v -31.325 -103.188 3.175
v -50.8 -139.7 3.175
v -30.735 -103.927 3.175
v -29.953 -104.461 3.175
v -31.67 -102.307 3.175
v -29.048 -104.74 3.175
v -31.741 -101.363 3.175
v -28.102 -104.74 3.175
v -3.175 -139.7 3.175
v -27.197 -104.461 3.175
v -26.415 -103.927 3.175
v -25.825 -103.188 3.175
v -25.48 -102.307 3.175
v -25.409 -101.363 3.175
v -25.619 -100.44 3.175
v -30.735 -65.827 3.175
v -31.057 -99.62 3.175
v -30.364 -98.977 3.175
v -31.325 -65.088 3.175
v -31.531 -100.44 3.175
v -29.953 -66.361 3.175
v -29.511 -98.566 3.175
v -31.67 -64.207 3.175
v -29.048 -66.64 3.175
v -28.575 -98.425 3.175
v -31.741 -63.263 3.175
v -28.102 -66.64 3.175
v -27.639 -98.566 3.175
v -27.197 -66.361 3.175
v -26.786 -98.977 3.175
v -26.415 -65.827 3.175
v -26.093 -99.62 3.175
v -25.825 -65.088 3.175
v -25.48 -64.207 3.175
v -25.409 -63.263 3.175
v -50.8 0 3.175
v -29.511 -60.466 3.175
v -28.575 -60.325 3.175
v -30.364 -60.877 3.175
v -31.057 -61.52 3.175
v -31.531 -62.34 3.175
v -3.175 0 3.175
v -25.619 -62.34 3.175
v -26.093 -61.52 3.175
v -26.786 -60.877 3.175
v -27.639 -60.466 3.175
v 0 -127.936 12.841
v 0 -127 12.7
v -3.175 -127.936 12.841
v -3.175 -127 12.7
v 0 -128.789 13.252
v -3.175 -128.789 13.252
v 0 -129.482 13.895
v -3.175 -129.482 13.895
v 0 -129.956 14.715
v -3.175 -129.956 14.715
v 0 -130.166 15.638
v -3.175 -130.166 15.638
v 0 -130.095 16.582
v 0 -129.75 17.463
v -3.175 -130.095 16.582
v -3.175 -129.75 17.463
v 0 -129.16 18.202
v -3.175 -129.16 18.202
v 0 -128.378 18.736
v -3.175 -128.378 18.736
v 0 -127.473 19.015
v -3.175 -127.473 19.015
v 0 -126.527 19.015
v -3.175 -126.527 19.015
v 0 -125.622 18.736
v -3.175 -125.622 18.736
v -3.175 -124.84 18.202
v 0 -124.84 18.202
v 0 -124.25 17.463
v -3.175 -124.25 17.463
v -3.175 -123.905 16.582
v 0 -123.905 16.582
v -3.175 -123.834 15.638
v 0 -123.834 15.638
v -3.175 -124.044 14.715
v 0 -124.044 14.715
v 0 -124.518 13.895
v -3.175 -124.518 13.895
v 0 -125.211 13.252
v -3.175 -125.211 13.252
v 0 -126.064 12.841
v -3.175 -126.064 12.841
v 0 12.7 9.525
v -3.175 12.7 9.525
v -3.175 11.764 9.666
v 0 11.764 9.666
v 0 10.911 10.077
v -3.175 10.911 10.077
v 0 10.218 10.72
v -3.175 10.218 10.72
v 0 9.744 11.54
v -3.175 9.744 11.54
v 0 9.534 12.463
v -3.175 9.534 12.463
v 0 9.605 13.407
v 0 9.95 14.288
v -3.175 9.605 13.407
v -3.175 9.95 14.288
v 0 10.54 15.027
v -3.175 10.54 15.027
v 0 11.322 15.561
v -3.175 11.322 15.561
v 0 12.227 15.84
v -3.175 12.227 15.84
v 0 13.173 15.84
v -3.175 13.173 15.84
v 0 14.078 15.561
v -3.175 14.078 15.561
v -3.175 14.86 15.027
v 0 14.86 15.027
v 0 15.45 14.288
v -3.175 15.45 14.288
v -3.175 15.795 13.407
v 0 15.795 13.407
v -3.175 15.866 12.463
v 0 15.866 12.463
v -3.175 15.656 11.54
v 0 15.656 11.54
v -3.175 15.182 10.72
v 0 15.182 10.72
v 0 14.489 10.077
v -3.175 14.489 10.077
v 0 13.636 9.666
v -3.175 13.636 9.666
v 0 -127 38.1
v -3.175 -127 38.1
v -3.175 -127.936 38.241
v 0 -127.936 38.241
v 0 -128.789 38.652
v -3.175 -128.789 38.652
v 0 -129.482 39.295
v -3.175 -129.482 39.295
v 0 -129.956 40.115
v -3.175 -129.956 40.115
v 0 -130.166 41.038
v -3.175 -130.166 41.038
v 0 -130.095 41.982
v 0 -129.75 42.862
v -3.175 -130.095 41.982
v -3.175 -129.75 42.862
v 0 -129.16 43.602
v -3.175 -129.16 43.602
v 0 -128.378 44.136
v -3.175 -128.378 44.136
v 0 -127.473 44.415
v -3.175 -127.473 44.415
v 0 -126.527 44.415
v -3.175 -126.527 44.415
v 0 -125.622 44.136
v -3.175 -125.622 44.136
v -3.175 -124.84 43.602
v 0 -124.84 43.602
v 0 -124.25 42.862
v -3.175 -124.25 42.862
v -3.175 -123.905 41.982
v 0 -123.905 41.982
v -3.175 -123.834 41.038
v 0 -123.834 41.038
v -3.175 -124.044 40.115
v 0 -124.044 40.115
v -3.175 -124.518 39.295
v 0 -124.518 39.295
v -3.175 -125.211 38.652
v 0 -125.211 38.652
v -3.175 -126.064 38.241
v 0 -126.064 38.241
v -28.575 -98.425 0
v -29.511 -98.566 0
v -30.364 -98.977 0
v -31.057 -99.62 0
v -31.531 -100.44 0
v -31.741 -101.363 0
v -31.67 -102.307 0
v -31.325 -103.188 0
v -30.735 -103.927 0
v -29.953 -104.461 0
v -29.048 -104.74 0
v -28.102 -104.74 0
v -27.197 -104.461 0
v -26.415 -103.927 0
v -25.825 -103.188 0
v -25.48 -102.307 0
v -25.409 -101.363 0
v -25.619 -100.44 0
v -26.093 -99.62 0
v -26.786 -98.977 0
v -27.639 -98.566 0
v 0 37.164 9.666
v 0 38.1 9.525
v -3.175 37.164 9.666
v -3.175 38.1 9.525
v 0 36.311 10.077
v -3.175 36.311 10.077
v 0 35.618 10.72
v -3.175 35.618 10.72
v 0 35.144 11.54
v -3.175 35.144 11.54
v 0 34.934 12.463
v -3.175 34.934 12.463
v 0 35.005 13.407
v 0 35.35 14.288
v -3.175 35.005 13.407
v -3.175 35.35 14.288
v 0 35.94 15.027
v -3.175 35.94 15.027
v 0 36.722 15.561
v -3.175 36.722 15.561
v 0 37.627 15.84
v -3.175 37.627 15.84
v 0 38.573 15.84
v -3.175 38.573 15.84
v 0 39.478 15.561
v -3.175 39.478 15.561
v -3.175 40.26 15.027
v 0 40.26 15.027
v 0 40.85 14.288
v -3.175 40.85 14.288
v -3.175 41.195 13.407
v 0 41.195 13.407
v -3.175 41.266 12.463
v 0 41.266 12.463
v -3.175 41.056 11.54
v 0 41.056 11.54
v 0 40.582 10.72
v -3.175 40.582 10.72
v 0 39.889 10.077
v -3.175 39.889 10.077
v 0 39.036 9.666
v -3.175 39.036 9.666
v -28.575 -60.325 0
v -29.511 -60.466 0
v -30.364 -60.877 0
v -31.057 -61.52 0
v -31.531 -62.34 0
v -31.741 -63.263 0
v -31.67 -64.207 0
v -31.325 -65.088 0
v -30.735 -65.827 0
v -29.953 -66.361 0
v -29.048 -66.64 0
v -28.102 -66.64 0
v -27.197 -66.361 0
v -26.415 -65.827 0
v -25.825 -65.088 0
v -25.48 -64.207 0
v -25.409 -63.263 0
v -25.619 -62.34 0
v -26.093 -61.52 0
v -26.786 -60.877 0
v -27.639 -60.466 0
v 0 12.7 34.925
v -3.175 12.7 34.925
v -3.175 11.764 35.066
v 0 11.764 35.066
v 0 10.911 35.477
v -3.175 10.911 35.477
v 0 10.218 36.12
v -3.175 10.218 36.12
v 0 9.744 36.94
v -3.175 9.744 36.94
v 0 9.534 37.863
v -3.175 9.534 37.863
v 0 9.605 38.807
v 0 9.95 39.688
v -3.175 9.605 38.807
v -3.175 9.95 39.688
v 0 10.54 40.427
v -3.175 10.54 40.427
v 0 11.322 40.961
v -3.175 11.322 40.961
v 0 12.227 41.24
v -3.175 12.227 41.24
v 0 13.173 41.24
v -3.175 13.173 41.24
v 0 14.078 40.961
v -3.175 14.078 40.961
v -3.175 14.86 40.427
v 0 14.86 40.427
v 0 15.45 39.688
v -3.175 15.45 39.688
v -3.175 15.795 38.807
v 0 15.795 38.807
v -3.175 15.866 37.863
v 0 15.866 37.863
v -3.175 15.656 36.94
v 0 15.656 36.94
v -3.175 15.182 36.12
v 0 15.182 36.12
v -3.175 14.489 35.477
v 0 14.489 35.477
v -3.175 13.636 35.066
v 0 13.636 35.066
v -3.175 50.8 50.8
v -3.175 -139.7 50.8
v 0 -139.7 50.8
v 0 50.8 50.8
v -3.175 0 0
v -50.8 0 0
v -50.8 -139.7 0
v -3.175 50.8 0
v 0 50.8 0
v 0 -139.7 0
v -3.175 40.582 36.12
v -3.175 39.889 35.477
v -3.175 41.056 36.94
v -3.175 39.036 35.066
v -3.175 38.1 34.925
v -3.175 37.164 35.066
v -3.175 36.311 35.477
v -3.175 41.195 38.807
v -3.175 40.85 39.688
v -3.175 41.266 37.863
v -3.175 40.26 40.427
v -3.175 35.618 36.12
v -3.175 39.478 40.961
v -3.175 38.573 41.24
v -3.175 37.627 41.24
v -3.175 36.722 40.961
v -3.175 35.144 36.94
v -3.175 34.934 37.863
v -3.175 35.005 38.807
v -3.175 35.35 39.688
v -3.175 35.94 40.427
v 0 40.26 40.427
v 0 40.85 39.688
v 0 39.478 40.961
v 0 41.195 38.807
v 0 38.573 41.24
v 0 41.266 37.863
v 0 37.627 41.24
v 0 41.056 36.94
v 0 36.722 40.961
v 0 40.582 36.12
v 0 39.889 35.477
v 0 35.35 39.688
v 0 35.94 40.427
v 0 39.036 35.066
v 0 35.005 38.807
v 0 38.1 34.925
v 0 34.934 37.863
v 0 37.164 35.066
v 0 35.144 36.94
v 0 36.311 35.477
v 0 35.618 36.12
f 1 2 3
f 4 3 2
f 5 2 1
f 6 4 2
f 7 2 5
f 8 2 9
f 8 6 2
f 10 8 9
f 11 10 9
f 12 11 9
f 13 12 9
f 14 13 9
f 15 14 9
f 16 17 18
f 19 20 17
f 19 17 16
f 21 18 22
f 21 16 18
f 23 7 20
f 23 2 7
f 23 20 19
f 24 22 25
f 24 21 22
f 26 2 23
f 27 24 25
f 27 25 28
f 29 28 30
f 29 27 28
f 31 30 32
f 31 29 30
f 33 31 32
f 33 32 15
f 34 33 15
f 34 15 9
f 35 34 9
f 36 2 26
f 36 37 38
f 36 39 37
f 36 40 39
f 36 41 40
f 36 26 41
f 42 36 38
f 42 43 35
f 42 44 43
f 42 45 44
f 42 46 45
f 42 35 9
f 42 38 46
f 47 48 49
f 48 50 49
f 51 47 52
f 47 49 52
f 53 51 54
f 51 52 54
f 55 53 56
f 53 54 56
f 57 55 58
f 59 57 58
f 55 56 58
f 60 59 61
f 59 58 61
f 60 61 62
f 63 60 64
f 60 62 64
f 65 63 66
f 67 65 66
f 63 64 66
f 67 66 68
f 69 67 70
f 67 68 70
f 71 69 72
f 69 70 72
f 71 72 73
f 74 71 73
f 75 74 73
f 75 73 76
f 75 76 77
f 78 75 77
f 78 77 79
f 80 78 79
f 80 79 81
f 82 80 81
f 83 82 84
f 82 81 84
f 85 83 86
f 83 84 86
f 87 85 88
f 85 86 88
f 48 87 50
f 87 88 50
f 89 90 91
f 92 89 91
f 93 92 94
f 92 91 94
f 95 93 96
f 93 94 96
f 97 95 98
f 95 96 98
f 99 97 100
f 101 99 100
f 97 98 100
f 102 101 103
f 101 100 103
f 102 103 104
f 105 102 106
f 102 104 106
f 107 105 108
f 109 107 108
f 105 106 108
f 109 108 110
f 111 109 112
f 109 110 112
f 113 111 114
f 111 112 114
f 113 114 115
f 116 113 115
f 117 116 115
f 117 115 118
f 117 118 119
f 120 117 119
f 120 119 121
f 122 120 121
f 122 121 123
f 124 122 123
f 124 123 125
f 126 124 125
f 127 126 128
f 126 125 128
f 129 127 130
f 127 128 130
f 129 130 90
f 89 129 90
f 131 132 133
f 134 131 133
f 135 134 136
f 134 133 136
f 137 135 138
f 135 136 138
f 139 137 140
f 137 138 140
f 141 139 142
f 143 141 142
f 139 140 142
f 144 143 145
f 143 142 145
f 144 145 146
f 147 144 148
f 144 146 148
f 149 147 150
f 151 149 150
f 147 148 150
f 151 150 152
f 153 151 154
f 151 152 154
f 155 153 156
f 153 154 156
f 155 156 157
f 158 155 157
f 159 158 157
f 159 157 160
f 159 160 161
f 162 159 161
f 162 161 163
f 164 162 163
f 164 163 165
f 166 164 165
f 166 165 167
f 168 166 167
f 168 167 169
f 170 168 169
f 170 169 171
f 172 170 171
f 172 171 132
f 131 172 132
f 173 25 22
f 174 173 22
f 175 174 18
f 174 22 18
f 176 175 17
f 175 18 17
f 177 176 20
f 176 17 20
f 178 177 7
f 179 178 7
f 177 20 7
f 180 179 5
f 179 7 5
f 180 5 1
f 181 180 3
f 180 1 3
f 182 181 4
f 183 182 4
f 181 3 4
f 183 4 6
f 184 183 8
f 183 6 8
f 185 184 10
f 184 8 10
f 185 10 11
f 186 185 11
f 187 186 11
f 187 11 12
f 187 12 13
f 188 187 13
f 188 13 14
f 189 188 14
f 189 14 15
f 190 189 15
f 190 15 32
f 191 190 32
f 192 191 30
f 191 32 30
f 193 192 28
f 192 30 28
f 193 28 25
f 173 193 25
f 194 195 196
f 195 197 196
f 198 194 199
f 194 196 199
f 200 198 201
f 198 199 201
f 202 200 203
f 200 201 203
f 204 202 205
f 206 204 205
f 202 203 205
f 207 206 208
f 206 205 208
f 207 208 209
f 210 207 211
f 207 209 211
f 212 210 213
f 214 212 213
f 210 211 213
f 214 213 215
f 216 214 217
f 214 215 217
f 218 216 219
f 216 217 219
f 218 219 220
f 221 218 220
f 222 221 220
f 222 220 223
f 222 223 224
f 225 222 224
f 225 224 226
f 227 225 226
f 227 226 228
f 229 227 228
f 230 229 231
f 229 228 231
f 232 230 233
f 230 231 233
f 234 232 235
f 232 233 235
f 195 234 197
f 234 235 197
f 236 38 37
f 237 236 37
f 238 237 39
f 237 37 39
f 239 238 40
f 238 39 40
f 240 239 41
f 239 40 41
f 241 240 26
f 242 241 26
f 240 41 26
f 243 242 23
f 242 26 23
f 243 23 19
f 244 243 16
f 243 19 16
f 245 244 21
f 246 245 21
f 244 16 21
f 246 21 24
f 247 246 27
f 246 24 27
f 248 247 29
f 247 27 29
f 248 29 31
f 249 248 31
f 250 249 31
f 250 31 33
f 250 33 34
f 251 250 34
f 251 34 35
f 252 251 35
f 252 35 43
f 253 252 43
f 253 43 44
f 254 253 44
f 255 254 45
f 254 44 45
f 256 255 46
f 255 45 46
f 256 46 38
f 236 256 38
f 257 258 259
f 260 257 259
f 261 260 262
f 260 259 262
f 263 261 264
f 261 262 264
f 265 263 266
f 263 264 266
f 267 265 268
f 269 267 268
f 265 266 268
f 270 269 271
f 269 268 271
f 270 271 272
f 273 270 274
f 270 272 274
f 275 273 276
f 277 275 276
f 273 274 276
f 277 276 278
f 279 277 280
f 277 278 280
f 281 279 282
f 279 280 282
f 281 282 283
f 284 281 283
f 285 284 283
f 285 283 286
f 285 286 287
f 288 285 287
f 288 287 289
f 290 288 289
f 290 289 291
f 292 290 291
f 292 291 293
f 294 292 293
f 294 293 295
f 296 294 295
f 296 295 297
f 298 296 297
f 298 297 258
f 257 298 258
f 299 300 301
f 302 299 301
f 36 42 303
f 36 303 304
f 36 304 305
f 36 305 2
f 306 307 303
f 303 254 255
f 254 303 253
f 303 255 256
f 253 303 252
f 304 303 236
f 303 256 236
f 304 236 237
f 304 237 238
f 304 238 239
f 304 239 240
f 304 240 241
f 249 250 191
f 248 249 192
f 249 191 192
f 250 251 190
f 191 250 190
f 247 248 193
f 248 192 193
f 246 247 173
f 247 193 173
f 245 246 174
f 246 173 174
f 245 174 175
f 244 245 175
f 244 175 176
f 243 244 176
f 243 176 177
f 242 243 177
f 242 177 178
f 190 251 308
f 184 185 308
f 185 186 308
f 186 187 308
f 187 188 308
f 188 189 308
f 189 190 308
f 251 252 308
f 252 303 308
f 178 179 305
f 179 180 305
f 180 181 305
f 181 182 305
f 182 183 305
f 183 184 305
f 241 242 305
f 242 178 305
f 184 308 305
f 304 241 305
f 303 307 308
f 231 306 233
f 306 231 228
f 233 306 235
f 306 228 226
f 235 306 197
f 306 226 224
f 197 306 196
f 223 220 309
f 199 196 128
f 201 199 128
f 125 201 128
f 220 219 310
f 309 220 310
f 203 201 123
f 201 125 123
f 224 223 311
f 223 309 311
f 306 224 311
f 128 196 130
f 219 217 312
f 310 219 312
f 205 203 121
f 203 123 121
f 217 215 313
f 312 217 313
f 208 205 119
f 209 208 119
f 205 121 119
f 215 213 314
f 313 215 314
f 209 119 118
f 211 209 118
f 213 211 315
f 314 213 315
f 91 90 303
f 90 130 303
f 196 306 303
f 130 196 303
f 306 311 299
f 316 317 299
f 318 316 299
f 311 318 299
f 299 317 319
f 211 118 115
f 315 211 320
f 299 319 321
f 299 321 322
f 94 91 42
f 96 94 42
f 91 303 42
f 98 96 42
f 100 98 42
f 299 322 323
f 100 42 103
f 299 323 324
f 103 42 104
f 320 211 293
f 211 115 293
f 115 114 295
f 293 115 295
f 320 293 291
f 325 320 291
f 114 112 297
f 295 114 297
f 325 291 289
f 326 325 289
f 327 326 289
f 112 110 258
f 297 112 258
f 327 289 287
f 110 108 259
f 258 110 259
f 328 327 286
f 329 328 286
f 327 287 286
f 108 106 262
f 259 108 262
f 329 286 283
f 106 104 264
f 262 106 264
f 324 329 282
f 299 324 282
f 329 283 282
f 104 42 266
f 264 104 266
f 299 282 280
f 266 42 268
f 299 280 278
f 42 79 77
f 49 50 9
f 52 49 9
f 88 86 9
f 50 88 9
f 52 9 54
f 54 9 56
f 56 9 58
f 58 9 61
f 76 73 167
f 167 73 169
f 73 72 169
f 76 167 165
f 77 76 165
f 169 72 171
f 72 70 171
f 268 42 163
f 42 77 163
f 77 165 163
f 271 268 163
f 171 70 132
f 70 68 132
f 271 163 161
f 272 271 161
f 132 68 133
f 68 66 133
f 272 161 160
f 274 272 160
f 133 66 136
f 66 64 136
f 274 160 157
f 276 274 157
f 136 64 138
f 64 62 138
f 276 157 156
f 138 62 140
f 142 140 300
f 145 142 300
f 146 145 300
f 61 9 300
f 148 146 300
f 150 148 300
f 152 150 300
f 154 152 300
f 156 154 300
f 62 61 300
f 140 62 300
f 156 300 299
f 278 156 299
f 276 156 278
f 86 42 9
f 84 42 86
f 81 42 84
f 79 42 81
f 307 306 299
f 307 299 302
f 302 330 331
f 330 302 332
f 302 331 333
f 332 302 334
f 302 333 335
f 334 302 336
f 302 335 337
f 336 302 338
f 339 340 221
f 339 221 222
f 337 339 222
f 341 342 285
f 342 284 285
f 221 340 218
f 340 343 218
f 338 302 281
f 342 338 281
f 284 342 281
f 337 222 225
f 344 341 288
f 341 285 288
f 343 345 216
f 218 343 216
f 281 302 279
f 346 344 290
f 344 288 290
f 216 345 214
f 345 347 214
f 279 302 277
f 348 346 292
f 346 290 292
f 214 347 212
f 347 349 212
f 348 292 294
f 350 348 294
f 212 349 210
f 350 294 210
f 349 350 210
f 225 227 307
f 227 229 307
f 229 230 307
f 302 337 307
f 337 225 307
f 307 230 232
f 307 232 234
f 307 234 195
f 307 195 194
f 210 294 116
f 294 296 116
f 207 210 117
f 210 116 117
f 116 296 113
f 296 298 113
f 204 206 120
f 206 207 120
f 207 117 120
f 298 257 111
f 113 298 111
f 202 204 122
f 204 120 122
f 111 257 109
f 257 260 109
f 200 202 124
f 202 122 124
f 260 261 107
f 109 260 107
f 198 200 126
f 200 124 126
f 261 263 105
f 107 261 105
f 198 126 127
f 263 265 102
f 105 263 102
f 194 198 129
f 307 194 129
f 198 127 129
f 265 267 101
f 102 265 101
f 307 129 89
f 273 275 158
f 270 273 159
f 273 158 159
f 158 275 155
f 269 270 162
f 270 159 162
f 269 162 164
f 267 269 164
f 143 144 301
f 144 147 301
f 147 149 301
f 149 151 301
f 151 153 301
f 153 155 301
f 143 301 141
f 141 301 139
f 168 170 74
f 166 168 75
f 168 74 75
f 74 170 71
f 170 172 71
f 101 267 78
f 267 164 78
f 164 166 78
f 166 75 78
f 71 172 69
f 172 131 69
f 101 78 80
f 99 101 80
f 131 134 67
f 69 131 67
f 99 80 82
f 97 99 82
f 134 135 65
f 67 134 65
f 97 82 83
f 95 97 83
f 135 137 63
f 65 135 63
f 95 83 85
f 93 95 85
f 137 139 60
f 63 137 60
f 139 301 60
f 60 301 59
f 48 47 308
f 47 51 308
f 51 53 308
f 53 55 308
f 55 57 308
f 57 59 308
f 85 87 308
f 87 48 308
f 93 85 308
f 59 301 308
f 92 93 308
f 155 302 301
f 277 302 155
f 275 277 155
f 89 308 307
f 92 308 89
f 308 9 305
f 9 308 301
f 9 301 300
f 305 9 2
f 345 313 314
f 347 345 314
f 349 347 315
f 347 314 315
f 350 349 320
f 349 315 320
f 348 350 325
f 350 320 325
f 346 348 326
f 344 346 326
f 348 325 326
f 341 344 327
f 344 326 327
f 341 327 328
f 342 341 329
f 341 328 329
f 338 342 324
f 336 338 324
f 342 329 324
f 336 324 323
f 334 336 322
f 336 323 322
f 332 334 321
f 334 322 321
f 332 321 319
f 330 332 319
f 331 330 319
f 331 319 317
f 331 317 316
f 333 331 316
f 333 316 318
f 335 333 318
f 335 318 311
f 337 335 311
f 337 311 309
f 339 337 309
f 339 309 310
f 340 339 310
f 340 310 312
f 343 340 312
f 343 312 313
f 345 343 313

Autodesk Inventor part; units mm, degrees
ref_plane "YZ Plane" through (0, 0, 0) normal (1, 0, 0) x (0, 1, 0)
ref_plane "XZ Plane" through (0, 0, 0) normal (0, 1, 0) x (-1, 0, 0)
ref_plane "XY Plane" through (0, 0, 0) normal (0, 0, 1) x (1, 0, 0)
sketch "Sketch1" plane through (0, 0, 0) normal (0, 1, 0) x (-1, 0, 0)
  line L0 (0, 0) -> (3.175, 0)
  line L1 (3.175, 0) -> (3.175, 50.8)
  line L2 (3.175, 50.8) -> (0, 50.8)
  line L3 (0, 50.8) -> (0, 0)
  line L4 (0, 0) -> (50.8, 0)
  line L5 (50.8, 0) -> (50.8, 3.175)
  line L6 (50.8, 3.175) -> (0, 3.175)
  line L7 (0, 3.175) -> (0, 0)
  dimension "d0" = 3.175
  dimension "d1" = 50.8
  dimension "d2" = 50.8
  dimension "d3" = 3.175
extrude "Extrusion1" add sketch "Sketch1" against normal blind 139.7
sketch "Sketch3" plane through (0, 0, 50.8) normal (1, 0, 0) x (0, 0, -1)
  line L0 (50.8, -139.7) -> (0, -139.7) projected
  line L1 (50.8, 0) -> (50.8, -139.7) projected
  line L2 (0, 0) -> (50.8, 0) projected
  line L3 (0, 0) -> (0, -139.7) projected
  point P0 (9.525, -127)
  point P1 (34.925, -127)
  dimension "d17" = 12.7
  dimension "d18" = 9.525
  dimension "d19" = 15.875
  dimension "d20" = 12.7
hole "Hole2" at (0, -127, 41.275) at (0, -127, 15.875) direction (-1, 0, 0) diameter 6.35 end through all
sketch "Sketch4" plane through (0, 0, 0) normal (0, 0, -1) x (-1, 0, 0)
  line L0 (0, 0) -> (50.8, 0) projected
  line L1 (0, 0) -> (0, -139.7) projected
  line L2 (50.8, -139.7) -> (0, -139.7) projected
  line L3 (50.8, 0) -> (50.8, -139.7) projected
  point P0 (28.575, -63.5)
  point P1 (28.575, -101.6)
  dimension "d28" = 28.575
  dimension "d29" = 63.5
  dimension "d30" = 101.6
  dimension "d31" = 28.575
hole "Hole3" at (-28.575, -63.5, 0) at (-28.575, -101.6, 0) direction (0, 0, 1) diameter 6.35 end through all
sketch "Sketch5" plane through (0, 0, 0) normal (0, 1, 0) x (1, 0, 0)
  line L0 (0, 0) -> (-3.175, 0)
  line L1 (-3.175, 0) -> (-3.175, -50.8)
  line L2 (-3.175, -50.8) -> (0, -50.8)
  line L3 (0, -50.8) -> (0, 0)
extrude "Extrusion2" add sketch "Sketch5" along normal blind 50.8
sketch "Sketch6" plane through (0, -139.7, 50.8) normal (1, 0, 0) x (0, 0, -1)
  circle A0 centre (9.525, 12.7) radius 3.175 projected
  circle A1 centre (34.925, 12.7) radius 3.175 projected
  line L0 (0, 0) -> (0, 190.5) projected
  line L1 (50.8, 0) -> (0, 0) projected
  line L2 (50.8, 190.5) -> (50.8, 0) projected
  line L3 (0, 190.5) -> (50.8, 190.5) projected
  point P0 (50.8, 139.7)
  point P1 (12.7, 152.4)
  point P2 (38.1, 152.4)
  point P3 (12.7, 177.8)
  point P4 (38.1, 177.8)
  dimension "d41" = 38.1
  dimension "d42" = 12.7
  dimension "d43" = 12.7
  dimension "d44" = 38.1
  dimension "d45" = 12.7
  dimension "d46" = 12.7
  dimension "d47" = 12.7
  dimension "d48" = 12.7
hole "Hole4" at (0, 12.7, 38.1) at (0, 12.7, 12.7) at (0, 38.1, 38.1) at (0, 38.1, 12.7) direction (-1, 0, 0) diameter 6.35 end through all
properties part number "2x2 angle vertical right"
